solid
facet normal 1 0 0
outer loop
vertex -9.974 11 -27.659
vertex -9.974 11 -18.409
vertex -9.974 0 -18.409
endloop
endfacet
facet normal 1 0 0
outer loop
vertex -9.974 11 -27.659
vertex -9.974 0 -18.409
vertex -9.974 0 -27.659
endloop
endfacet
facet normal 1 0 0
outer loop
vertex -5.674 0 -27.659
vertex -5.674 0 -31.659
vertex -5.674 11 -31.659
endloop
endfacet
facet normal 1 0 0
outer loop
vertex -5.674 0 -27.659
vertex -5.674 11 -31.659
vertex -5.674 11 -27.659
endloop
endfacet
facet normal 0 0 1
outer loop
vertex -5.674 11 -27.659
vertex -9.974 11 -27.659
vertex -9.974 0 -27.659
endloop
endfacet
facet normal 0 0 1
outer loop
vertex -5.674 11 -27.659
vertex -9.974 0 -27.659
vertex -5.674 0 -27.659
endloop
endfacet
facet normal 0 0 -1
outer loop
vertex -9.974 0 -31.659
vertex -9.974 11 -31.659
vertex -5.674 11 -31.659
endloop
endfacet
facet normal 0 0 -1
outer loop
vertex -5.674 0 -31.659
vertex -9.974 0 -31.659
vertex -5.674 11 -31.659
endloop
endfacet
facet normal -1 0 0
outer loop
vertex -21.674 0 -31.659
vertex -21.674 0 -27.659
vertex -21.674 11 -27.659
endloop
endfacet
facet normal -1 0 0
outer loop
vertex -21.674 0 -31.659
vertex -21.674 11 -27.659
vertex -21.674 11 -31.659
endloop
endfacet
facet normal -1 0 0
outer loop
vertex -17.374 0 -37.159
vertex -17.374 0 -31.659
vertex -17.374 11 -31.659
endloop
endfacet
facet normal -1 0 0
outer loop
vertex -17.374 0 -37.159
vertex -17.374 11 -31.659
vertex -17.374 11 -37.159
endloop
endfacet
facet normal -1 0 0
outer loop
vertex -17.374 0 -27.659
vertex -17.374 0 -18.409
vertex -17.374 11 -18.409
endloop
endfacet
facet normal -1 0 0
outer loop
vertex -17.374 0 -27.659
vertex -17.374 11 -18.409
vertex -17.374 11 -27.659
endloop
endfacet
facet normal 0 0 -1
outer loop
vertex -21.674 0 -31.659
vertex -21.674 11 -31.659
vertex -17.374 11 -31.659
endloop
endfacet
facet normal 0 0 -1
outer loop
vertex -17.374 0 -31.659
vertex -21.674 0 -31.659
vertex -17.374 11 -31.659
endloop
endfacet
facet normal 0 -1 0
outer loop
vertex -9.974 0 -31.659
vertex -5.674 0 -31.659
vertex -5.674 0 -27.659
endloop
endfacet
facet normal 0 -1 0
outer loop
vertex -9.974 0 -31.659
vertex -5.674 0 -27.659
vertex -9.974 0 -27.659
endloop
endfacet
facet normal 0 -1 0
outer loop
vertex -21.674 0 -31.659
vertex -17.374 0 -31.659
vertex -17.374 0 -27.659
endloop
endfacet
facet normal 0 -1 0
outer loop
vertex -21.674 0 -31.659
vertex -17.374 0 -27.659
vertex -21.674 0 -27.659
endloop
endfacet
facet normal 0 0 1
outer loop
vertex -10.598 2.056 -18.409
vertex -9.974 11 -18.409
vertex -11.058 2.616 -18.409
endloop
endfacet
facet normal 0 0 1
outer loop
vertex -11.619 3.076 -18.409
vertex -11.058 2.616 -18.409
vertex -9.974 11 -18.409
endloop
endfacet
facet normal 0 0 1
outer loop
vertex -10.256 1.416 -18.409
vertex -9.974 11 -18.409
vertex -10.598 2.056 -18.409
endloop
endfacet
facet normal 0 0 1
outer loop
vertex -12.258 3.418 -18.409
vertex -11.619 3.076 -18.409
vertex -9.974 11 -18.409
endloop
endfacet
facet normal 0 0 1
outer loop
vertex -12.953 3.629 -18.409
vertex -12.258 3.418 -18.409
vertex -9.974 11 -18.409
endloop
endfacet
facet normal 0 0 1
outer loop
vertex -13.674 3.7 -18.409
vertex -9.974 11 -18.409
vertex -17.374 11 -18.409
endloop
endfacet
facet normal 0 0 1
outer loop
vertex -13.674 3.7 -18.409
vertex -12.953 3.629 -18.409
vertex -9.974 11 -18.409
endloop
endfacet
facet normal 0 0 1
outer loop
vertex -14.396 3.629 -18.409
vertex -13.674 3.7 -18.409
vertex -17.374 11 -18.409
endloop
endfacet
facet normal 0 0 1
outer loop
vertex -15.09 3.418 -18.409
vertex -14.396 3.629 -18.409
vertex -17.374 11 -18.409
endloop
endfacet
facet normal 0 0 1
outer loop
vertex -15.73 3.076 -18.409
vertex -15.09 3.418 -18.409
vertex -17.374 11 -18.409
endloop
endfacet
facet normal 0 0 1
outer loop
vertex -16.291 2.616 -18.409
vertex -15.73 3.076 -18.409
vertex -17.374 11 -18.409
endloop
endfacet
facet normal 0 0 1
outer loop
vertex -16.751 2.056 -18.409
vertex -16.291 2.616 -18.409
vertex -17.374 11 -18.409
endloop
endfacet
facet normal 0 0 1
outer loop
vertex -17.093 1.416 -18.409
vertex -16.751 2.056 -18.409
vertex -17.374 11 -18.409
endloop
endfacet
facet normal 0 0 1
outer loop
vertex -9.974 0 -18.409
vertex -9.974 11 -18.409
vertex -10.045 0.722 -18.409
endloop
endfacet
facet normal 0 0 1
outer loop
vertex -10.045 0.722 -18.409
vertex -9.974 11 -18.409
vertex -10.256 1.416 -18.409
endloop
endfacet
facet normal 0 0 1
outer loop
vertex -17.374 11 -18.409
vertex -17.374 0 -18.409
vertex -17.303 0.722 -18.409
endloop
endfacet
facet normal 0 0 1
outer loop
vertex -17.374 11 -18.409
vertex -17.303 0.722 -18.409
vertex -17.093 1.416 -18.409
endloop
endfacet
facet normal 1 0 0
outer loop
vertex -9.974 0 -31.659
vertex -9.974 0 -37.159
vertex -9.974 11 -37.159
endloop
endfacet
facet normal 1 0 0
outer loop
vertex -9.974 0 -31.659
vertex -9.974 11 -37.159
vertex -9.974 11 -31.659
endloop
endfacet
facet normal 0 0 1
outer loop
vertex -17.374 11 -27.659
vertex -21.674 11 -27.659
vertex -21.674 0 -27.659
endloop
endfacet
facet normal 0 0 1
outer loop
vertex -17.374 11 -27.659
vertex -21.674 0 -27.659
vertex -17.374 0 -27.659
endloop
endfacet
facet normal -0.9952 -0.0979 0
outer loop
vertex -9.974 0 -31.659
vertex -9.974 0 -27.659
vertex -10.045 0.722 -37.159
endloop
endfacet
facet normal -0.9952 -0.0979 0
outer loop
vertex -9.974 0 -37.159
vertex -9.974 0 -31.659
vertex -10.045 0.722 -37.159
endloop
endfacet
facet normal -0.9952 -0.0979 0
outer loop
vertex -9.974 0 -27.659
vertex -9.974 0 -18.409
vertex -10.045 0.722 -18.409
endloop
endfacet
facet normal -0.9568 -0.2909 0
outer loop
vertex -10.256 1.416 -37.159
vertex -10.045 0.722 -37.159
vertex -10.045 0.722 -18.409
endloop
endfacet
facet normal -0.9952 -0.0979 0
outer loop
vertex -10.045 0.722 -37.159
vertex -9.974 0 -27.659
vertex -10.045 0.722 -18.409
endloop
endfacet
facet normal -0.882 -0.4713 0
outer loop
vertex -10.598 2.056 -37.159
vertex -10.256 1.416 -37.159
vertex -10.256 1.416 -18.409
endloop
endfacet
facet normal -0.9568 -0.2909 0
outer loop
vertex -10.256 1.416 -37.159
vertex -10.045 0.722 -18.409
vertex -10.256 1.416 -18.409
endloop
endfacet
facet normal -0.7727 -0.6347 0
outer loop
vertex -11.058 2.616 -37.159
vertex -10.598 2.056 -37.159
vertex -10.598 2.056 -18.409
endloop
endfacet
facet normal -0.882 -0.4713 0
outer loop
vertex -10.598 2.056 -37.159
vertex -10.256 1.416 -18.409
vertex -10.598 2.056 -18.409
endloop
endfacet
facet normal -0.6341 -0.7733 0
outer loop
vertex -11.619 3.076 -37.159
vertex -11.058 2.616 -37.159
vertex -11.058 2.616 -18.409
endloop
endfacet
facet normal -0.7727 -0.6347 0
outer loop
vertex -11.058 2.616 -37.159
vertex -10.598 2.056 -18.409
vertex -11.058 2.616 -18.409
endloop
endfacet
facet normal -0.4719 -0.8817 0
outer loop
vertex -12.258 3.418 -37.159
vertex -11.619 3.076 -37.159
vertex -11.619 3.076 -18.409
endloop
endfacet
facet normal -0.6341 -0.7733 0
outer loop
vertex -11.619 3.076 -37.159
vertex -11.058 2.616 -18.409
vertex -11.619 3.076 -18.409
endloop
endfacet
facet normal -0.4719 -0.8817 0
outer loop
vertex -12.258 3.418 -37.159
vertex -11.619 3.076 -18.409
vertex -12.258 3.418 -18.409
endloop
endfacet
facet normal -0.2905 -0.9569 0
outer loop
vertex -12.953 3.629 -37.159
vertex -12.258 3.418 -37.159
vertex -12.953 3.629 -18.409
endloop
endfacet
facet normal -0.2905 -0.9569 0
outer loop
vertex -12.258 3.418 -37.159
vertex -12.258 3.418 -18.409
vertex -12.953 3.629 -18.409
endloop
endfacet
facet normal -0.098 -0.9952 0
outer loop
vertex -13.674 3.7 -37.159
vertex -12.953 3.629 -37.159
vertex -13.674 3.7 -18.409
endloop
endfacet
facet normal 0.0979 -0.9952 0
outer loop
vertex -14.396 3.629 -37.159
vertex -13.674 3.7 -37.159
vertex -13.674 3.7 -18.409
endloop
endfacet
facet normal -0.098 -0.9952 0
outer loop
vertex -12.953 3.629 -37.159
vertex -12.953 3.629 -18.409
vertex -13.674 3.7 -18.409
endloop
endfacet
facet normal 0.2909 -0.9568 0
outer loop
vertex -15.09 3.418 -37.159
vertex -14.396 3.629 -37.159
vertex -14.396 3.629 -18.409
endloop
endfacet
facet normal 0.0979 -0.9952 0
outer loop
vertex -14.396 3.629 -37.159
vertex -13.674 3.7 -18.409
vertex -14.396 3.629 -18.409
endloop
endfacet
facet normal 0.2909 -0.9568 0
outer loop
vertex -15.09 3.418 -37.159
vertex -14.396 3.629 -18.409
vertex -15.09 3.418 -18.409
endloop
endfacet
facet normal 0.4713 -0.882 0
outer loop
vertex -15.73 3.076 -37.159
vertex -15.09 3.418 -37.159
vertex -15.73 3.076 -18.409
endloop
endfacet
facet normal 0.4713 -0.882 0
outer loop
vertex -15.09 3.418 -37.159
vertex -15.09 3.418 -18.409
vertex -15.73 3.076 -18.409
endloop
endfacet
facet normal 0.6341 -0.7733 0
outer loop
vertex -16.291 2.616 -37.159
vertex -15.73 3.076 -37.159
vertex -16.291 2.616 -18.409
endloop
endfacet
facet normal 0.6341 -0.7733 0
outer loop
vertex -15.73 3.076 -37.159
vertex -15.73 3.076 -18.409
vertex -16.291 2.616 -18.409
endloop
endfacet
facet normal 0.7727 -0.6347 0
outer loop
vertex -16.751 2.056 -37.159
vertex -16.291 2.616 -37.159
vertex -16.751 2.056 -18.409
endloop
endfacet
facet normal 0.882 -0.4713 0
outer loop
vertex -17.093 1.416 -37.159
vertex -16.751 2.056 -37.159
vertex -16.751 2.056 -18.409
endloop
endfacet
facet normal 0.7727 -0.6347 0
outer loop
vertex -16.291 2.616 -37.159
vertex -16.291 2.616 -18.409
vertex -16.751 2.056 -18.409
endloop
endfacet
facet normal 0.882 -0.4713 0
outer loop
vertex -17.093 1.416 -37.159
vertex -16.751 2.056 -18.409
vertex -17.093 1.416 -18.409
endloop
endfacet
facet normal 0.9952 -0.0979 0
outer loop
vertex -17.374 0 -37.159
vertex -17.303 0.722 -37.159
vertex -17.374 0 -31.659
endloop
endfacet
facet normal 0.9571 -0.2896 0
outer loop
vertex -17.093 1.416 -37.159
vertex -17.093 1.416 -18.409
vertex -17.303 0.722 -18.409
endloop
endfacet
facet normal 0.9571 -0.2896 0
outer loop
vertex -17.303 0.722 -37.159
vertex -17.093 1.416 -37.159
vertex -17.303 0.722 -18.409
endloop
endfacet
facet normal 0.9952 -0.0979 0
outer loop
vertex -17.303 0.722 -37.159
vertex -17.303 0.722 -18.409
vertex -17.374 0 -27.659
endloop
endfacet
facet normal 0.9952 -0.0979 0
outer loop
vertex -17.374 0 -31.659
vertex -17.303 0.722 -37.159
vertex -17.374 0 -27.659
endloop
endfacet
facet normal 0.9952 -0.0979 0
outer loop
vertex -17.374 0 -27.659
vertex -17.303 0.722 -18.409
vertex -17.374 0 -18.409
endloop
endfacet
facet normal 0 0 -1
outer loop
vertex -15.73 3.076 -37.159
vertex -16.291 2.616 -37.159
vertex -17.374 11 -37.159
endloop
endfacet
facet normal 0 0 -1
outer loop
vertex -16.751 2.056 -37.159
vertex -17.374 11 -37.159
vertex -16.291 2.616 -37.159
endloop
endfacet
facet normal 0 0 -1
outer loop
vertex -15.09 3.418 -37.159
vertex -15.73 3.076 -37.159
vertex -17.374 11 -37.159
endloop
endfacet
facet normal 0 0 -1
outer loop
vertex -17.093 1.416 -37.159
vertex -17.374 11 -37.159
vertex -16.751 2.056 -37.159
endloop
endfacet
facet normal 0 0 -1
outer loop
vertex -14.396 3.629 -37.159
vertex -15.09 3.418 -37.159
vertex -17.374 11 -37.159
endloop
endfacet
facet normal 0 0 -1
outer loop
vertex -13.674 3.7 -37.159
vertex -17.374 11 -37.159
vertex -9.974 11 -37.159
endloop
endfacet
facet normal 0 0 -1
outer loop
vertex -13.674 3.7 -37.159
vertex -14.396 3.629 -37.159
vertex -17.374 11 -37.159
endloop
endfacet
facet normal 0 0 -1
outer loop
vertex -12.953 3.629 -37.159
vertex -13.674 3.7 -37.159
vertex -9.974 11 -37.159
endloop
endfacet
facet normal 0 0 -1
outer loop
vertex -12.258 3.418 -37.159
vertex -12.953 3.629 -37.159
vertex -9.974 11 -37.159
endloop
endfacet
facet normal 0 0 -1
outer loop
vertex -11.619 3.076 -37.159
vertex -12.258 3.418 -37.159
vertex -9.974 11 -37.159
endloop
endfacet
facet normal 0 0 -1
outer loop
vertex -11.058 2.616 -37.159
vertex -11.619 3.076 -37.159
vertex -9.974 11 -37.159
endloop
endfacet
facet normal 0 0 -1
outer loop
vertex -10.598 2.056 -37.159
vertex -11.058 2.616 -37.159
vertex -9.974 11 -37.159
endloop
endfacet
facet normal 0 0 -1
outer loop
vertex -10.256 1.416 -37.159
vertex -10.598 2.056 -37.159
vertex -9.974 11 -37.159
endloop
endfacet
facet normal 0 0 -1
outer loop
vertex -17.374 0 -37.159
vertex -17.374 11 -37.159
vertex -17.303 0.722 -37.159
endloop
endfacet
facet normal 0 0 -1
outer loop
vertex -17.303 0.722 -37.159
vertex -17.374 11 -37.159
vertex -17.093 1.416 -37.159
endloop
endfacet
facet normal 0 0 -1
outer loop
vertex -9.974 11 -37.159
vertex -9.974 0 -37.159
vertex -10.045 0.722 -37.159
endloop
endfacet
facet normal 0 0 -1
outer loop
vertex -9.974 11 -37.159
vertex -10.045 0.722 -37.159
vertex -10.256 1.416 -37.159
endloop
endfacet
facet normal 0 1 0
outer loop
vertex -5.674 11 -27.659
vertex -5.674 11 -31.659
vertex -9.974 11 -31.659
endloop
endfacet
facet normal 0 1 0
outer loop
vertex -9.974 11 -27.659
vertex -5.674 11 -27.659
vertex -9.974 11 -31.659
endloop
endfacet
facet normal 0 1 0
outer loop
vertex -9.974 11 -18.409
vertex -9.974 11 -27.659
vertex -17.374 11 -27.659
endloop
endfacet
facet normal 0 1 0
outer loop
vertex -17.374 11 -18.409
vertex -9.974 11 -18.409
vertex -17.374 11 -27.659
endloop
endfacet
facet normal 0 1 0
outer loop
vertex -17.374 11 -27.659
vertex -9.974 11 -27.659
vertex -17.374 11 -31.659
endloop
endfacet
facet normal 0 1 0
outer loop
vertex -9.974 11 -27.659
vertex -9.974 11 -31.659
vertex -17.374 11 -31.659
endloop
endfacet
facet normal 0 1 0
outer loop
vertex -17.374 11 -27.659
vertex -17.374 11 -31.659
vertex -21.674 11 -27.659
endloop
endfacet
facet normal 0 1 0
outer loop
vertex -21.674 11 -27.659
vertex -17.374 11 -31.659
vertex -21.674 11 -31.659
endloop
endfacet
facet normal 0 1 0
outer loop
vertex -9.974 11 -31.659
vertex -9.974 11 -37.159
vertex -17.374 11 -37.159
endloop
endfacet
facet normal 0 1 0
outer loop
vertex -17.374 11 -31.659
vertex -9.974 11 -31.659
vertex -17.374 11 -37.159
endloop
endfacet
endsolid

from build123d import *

# Parameters (mm, degrees)
BOSS_EXTRU_1_DEPTH      = 11
ENL_V_MAT_EXTRU_1_DEPTH = 31.697565104
ESQUISSE3_W             = 4.3
ESQUISSE3_H             = 0.5
ENL_V_MAT_EXTRU_2_DEPTH = 45.402774751


with BuildPart() as part:
    # Esquisse1 → Boss.-Extru.1 (new body)
    with BuildSketch(Plane(origin=(0, 0, 0), x_dir=(1, 0, 0), z_dir=(0, 1, 0))):
        Polygon((-17.374362812, 37.159499489), (-9.974362812, 37.159499489), (-9.974362812, 32.159499489), (-5.674362812, 32.159499489), (-5.674362812, 27.159499489), (-9.974362812, 27.159499489), (-9.974362812, 18.409499489), (-17.374362812, 18.409499489), (-17.374362812, 27.159499489), (-21.674362812, 27.159499489), (-21.674362812, 32.159499489), (-17.374362812, 32.159499489), align=None)
    extrude(amount=BOSS_EXTRU_1_DEPTH)

    # Esquisse2 → Enlèv. mat.-Extru.1 (cut, through all)
    with BuildSketch(Plane.XY.offset(-18.409499489)):
        with BuildLine():
            ThreePointArc((-9.974362812, 0), (-13.674362812, 3.7), (-17.374362812, 0))
            Line((-17.374362812, 0), (-9.974362812, 0))
        make_face()
        with BuildLine():
            Line((-9.974362812, 0), (-17.374362812, 0))
            ThreePointArc((-17.374362812, 0), (-13.674362812, -3.7), (-9.974362812, 0))
        make_face()
    extrude(amount=-ENL_V_MAT_EXTRU_1_DEPTH, mode=Mode.SUBTRACT)

    # Esquisse3 → Enlèv. mat.-Extru.2 (cut, through all)
    with BuildSketch(Plane(origin=(0, 11, 0), x_dir=(1, 0, 0), z_dir=(0, 1, 0))):
        with Locations((-7.824362812, 31.909499489)):
            Rectangle(ESQUISSE3_W, ESQUISSE3_H)
        with Locations((-19.524362812, 31.909499489)):
            Rectangle(ESQUISSE3_W, ESQUISSE3_H)
        with Locations((-19.524362812, 27.409499489)):
            Rectangle(ESQUISSE3_W, ESQUISSE3_H)
        with Locations((-7.824362812, 27.409499489)):
            Rectangle(ESQUISSE3_W, ESQUISSE3_H)
    extrude(amount=-ENL_V_MAT_EXTRU_2_DEPTH, mode=Mode.SUBTRACT)


solid = part.part
